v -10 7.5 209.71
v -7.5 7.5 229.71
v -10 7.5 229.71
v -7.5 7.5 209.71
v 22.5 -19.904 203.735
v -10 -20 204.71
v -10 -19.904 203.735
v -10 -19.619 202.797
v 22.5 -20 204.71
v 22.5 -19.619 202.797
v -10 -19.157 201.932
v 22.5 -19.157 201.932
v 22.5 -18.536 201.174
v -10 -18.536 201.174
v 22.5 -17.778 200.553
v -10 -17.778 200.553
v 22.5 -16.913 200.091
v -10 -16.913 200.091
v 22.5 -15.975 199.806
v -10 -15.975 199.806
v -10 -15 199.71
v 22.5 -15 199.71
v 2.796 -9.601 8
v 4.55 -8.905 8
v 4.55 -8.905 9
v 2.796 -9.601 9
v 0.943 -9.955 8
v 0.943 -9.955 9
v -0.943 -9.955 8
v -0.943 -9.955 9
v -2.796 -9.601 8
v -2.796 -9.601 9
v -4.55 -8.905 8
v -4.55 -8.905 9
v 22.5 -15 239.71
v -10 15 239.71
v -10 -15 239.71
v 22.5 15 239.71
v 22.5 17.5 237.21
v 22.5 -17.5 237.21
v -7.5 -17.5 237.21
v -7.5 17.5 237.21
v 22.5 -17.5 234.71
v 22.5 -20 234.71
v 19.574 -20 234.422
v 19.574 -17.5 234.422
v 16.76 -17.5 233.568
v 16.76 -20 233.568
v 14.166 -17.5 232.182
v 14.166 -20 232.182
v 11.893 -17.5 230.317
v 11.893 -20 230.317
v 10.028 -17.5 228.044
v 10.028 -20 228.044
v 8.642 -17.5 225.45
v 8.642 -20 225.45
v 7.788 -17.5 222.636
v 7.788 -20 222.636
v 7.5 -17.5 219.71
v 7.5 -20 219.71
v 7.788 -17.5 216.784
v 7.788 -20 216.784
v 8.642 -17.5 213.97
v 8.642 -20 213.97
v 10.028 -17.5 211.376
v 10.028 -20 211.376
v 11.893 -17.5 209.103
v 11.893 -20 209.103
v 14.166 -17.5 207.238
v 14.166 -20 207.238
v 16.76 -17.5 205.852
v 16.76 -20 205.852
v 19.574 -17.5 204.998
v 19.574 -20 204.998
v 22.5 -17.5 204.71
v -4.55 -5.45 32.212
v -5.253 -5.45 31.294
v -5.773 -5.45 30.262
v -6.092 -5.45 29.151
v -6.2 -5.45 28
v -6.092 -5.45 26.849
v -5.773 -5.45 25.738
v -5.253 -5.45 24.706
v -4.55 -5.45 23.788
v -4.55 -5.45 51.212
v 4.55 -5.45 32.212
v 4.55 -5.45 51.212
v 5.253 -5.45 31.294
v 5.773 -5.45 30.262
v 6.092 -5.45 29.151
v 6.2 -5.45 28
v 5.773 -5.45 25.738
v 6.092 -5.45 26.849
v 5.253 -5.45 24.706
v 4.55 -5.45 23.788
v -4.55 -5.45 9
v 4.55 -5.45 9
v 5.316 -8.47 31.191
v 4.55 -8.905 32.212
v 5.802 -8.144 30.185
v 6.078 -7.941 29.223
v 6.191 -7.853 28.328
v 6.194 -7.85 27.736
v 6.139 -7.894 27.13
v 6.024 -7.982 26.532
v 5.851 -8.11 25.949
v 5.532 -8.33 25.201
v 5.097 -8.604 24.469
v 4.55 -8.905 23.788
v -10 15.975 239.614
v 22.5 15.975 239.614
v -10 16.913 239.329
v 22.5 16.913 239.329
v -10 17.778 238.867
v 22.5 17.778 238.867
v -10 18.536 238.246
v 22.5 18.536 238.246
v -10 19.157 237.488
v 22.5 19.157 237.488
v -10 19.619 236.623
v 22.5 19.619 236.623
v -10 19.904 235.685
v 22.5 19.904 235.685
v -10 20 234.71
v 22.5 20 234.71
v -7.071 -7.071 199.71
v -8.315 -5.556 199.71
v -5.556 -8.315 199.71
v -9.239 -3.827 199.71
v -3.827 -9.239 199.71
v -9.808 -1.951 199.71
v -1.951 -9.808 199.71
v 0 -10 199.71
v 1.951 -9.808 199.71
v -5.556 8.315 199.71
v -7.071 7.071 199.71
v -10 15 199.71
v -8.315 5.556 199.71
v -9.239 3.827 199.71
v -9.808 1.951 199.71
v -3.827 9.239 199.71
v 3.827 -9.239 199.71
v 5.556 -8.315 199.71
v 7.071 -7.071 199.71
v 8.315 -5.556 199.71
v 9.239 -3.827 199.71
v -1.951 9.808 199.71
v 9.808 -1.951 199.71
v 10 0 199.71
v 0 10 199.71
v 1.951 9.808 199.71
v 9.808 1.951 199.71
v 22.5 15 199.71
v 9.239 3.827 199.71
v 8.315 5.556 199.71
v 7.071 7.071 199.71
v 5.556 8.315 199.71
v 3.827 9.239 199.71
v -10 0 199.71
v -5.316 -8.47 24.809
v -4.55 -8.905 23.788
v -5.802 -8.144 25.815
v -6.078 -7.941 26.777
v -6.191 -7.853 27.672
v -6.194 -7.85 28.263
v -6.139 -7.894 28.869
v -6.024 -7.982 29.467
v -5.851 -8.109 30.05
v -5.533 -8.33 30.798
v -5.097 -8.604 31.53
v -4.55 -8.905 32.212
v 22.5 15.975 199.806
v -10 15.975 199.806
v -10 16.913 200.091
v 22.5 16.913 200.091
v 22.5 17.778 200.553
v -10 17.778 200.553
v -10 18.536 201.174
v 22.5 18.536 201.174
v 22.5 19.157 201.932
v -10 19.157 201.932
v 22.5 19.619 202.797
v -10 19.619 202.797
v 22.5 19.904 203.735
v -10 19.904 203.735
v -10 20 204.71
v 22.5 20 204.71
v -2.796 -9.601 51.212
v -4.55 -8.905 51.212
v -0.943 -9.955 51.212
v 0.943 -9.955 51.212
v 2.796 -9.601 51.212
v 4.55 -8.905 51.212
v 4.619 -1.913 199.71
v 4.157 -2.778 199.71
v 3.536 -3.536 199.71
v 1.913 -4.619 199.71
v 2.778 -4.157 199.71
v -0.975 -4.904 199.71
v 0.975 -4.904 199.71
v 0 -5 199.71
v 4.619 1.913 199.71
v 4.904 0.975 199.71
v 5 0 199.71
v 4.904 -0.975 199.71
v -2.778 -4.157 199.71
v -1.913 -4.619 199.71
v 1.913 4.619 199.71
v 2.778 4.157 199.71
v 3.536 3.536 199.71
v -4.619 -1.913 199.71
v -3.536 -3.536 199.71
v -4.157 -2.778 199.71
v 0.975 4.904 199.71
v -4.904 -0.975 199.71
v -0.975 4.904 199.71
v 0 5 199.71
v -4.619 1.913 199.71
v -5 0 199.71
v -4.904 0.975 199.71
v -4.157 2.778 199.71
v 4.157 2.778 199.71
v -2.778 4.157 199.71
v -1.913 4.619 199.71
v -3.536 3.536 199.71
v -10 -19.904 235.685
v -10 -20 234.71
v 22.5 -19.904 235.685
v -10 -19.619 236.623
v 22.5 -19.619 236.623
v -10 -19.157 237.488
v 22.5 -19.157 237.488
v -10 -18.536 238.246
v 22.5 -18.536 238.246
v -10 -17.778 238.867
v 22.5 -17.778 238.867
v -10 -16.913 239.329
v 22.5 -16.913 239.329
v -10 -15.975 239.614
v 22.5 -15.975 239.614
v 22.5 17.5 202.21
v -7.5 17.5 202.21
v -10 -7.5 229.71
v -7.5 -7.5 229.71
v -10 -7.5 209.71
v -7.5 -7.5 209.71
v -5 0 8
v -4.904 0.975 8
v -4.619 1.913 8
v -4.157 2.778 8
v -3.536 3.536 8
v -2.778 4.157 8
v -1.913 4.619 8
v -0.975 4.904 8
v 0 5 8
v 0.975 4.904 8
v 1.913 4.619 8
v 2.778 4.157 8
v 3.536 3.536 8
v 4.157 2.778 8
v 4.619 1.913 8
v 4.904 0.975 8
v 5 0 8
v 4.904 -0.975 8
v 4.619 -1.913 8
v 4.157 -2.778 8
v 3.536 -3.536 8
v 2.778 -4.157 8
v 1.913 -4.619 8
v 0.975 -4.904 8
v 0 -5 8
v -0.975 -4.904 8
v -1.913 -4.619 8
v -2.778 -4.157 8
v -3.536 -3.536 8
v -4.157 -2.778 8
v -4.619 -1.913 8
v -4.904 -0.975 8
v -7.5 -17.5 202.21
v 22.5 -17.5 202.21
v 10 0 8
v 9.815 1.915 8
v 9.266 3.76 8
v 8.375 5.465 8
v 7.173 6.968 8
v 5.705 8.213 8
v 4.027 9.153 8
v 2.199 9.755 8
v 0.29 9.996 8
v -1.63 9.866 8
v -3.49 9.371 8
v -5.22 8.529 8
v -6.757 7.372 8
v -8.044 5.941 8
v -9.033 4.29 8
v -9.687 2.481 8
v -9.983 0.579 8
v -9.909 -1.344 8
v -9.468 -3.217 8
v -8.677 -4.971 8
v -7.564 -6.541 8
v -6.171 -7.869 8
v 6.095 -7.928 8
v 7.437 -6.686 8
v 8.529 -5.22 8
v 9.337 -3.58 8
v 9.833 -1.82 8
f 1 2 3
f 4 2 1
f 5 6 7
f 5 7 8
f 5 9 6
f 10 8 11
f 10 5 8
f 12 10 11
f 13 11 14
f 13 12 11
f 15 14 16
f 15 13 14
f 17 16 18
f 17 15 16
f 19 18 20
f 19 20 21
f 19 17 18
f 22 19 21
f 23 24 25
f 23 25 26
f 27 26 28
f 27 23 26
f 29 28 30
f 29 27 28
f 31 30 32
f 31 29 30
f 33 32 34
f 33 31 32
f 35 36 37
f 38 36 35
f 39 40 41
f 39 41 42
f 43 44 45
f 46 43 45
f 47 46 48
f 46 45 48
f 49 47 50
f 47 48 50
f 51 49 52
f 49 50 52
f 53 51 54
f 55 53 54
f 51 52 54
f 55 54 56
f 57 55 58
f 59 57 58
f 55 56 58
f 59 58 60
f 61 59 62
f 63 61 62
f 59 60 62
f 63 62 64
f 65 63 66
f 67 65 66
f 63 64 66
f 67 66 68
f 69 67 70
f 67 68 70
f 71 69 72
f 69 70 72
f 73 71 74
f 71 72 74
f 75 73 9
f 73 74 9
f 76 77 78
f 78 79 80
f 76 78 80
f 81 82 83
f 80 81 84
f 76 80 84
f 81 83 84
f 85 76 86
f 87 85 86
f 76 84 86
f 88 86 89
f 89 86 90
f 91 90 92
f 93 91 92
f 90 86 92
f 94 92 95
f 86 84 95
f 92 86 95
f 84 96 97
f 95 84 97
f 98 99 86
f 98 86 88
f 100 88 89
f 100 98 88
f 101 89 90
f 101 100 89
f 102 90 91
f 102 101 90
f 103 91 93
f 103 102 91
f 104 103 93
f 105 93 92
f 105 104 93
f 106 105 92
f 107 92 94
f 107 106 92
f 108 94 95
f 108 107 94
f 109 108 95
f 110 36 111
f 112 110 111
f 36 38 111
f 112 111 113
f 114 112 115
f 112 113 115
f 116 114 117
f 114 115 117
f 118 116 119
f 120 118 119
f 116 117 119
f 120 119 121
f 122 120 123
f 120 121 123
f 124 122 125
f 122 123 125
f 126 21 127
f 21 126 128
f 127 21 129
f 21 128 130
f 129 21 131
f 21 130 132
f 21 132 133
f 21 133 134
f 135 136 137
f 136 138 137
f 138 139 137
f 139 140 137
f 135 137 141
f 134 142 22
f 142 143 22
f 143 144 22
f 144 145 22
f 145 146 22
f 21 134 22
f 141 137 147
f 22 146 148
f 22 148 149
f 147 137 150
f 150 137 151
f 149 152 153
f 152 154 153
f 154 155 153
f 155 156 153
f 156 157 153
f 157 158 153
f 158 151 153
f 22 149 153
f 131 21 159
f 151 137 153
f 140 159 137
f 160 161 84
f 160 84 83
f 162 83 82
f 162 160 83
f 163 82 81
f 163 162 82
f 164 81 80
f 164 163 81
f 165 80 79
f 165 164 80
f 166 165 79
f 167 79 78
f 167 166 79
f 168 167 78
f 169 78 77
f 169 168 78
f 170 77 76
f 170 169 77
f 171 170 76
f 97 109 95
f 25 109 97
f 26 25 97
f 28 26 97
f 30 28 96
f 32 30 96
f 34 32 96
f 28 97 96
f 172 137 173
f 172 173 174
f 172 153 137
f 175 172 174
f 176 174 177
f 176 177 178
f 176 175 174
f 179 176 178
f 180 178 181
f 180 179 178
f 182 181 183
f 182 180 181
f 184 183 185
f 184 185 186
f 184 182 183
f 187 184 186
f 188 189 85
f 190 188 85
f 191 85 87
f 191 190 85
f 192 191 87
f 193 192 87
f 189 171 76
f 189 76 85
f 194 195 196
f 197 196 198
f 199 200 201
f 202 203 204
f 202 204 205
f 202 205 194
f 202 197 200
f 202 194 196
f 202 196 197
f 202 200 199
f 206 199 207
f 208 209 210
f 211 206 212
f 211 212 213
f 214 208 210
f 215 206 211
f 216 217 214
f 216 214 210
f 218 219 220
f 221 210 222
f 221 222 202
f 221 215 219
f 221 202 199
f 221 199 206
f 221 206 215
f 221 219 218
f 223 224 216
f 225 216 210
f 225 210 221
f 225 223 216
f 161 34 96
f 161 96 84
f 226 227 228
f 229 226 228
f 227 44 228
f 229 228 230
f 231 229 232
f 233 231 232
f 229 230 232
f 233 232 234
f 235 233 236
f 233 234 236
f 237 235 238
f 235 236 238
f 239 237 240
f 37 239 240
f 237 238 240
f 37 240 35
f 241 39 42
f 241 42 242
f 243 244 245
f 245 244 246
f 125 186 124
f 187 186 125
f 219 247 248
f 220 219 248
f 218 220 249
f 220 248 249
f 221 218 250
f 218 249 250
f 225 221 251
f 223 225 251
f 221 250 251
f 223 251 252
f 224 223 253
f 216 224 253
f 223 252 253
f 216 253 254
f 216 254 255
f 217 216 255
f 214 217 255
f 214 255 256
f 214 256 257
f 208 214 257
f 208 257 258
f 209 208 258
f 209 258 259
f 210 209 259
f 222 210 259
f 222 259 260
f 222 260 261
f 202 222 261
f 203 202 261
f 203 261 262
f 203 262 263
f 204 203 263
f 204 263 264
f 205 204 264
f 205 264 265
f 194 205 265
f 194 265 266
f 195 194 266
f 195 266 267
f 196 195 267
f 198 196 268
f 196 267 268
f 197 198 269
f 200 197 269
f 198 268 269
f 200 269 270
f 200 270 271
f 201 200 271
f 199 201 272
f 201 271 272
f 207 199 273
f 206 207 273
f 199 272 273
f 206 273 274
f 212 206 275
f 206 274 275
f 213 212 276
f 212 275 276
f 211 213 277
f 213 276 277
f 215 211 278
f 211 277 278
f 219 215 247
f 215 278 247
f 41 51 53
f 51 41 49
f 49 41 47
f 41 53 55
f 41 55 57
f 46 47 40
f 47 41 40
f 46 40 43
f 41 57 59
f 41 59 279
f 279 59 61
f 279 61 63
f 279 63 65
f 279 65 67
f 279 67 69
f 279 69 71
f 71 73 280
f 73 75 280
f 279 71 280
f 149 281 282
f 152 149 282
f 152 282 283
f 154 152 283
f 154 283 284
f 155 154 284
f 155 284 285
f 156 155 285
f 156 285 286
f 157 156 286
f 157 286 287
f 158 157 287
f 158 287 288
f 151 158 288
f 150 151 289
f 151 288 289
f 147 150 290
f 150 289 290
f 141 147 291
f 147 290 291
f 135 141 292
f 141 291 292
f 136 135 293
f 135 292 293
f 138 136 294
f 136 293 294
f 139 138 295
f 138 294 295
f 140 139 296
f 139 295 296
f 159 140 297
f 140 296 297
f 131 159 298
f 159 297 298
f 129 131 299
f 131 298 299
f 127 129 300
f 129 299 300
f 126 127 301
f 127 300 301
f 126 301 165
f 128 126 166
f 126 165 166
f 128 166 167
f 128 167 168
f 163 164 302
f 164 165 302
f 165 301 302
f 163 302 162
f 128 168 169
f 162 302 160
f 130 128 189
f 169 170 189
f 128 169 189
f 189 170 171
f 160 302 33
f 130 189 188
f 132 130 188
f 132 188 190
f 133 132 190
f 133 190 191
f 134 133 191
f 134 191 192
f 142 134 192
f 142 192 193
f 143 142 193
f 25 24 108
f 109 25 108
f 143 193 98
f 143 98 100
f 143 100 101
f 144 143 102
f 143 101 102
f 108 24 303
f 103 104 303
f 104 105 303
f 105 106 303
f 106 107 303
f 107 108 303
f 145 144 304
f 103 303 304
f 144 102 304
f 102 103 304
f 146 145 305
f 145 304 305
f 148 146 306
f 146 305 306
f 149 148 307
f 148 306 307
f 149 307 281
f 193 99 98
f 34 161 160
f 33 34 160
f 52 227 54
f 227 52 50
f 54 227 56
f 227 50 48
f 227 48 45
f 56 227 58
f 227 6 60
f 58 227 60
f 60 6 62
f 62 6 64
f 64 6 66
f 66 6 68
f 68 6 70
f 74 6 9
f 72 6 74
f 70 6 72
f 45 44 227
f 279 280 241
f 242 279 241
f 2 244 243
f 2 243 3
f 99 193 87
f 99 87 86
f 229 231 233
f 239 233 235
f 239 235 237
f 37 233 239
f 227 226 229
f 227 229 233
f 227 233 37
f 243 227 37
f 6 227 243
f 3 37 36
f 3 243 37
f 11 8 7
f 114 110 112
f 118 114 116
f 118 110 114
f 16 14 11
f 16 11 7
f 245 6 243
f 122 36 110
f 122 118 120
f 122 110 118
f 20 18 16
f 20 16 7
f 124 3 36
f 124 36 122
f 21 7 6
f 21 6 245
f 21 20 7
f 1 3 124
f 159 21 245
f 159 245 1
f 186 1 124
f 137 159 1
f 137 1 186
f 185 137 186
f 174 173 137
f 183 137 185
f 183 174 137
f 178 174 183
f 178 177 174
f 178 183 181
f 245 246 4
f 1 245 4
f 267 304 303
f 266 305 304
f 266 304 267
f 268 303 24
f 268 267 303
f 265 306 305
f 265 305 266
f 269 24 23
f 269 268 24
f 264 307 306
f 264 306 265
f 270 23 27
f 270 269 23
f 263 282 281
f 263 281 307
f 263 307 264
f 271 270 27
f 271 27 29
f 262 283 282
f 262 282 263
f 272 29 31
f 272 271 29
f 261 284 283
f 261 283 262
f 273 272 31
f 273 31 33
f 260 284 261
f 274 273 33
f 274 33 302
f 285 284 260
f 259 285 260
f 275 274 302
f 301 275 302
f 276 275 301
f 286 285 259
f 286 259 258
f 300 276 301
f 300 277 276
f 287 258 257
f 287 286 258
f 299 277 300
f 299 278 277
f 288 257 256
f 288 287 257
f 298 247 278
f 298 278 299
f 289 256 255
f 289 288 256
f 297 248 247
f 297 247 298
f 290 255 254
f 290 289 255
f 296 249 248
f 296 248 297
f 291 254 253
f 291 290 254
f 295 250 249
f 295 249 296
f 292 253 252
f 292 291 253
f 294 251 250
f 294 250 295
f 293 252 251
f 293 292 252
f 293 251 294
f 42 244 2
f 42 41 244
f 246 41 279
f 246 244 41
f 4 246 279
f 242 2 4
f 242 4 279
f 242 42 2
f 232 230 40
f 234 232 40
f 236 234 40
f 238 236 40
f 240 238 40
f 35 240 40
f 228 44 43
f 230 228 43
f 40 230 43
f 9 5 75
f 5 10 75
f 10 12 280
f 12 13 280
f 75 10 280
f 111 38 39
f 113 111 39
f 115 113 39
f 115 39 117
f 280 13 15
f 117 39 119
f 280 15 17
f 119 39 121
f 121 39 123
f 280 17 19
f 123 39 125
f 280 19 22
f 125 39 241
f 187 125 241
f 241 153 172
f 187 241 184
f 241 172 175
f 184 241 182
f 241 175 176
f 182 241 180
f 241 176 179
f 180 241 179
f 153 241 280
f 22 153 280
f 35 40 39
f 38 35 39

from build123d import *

# Parameters (mm, degrees)
SKETCH2_R           = 10
BOSS_EXTRUDE1_DEPTH = 199.71
CUT_EXTRUDE2_DEPTH  = 4.55
SKETCH5_W           = 32.5
SKETCH5_H           = 40
BOSS_EXTRUDE2_DEPTH = 40
SKETCH10_W          = 35
SKETCH10_H          = 35
CUT_EXTRUDE3_DEPTH  = 30
SKETCH11_W          = 20
SKETCH11_H          = 15
CUT_EXTRUDE4_DEPTH  = 2.5
FILLET1_R           = 5
SKETCH12_R          = 5
CUT_EXTRUDE5_DEPTH  = 199.71
SKETCH2_2_R         = 10
CUT_EXTRUDE6_DEPTH  = 8
BOSS_EXTRUDE3_DEPTH = 1
SKETCH16_R          = 15
CUT_EXTRUDE7_DEPTH  = 10


with BuildPart() as part:
    # Sketch2 → Boss-Extrude1 (new body)
    with BuildSketch(Plane.XY):
        Circle(SKETCH2_R)
    extrude(amount=BOSS_EXTRUDE1_DEPTH)

    # Sketch4 → Cut-Extrude2 (cut)
    with BuildSketch(Plane(origin=(0, -10, 0), x_dir=(-1, 0, 0), z_dir=(0, -1, 0))):
        with BuildLine():
            Line((-4.55, -23.788408852), (-4.55, -4.788408852))
            Line((-4.55, -4.788408852), (4.55, -4.788408852))
            Line((4.55, -4.788408852), (4.55, -23.788408852))
            ThreePointArc((4.55, -23.788408852), (6.2, -28), (4.55, -32.211591148))
            Line((4.55, -32.211591148), (4.55, -51.211591148))
            Line((4.55, -51.211591148), (-4.55, -51.211591148))
            Line((-4.55, -51.211591148), (-4.55, -32.211591148))
            ThreePointArc((-4.55, -32.211591148), (-6.2, -28), (-4.55, -23.788408852))
        make_face()
    extrude(amount=-CUT_EXTRUDE2_DEPTH, mode=Mode.SUBTRACT)

    # Sketch5 → Boss-Extrude2 (add)
    with BuildSketch(Plane.XY.offset(199.71)):
        with Locations((6.25, 0)):
            Rectangle(SKETCH5_W, SKETCH5_H)
    extrude(amount=BOSS_EXTRUDE2_DEPTH)

    # Sketch10 → Cut-Extrude3 (cut)
    with BuildSketch(Plane(origin=(22.5, 0, 0), x_dir=(0, 0, -1), z_dir=(1, 0, 0))):
        with Locations((-219.71, 0)):
            Rectangle(SKETCH10_W, SKETCH10_H)
    extrude(amount=-CUT_EXTRUDE3_DEPTH, mode=Mode.SUBTRACT)

    # Sketch11 → Cut-Extrude4 (cut)
    with BuildSketch(Plane(origin=(-7.5, 0, 0), x_dir=(0, 0, -1), z_dir=(1, 0, 0))):
        with Locations((-219.71, 0)):
            Rectangle(SKETCH11_W, SKETCH11_H)
    extrude(amount=-CUT_EXTRUDE4_DEPTH, mode=Mode.SUBTRACT)

    # Fillet1
    fillet1_edges = [part.edges().sort_by_distance(p)[0] for p in [
        (6.25, 20, 199.71),
        (6.25, -20, 199.71),
        (6.25, 20, 239.71),
        (6.25, -20, 239.71),
    ]]
    fillet(fillet1_edges, radius=FILLET1_R)

    # Sketch12 → Cut-Extrude5 (cut)
    with BuildSketch(Plane(origin=(0, 0, 0), x_dir=(-1, 0, 0), z_dir=(0, 0, -1))):
        Circle(SKETCH12_R)
    extrude(amount=-CUT_EXTRUDE5_DEPTH, mode=Mode.SUBTRACT)

    # Sketch2<2> → Cut-Extrude6 (cut)
    with BuildSketch(Plane.XY):
        with Locations(Location((0, 0, 0), (0, 0, 180))):
            Circle(SKETCH2_2_R)
    extrude(amount=CUT_EXTRUDE6_DEPTH, mode=Mode.SUBTRACT)

    # Sketch15 → Boss-Extrude3 (add)
    with BuildSketch(Plane(origin=(0, 0, 8), x_dir=(-1, 0, 0), z_dir=(0, 0, -1))):
        with BuildLine():
            Line((4.55, -8.904914374), (4.55, -5.45))
            Line((4.55, -5.45), (-4.55, -5.45))
            Line((-4.55, -5.45), (-4.55, -8.904914374))
            ThreePointArc((-4.55, -8.904914374), (0, -10), (4.55, -8.904914374))
        make_face()
    extrude(amount=-BOSS_EXTRUDE3_DEPTH)

    # Sketch16 → Cut-Extrude7 (cut)
    with BuildSketch(Plane.XZ.offset(20)):
        with Locations((22.5, 219.71)):
            Circle(SKETCH16_R)
    extrude(amount=-CUT_EXTRUDE7_DEPTH, mode=Mode.SUBTRACT)


solid = part.part
